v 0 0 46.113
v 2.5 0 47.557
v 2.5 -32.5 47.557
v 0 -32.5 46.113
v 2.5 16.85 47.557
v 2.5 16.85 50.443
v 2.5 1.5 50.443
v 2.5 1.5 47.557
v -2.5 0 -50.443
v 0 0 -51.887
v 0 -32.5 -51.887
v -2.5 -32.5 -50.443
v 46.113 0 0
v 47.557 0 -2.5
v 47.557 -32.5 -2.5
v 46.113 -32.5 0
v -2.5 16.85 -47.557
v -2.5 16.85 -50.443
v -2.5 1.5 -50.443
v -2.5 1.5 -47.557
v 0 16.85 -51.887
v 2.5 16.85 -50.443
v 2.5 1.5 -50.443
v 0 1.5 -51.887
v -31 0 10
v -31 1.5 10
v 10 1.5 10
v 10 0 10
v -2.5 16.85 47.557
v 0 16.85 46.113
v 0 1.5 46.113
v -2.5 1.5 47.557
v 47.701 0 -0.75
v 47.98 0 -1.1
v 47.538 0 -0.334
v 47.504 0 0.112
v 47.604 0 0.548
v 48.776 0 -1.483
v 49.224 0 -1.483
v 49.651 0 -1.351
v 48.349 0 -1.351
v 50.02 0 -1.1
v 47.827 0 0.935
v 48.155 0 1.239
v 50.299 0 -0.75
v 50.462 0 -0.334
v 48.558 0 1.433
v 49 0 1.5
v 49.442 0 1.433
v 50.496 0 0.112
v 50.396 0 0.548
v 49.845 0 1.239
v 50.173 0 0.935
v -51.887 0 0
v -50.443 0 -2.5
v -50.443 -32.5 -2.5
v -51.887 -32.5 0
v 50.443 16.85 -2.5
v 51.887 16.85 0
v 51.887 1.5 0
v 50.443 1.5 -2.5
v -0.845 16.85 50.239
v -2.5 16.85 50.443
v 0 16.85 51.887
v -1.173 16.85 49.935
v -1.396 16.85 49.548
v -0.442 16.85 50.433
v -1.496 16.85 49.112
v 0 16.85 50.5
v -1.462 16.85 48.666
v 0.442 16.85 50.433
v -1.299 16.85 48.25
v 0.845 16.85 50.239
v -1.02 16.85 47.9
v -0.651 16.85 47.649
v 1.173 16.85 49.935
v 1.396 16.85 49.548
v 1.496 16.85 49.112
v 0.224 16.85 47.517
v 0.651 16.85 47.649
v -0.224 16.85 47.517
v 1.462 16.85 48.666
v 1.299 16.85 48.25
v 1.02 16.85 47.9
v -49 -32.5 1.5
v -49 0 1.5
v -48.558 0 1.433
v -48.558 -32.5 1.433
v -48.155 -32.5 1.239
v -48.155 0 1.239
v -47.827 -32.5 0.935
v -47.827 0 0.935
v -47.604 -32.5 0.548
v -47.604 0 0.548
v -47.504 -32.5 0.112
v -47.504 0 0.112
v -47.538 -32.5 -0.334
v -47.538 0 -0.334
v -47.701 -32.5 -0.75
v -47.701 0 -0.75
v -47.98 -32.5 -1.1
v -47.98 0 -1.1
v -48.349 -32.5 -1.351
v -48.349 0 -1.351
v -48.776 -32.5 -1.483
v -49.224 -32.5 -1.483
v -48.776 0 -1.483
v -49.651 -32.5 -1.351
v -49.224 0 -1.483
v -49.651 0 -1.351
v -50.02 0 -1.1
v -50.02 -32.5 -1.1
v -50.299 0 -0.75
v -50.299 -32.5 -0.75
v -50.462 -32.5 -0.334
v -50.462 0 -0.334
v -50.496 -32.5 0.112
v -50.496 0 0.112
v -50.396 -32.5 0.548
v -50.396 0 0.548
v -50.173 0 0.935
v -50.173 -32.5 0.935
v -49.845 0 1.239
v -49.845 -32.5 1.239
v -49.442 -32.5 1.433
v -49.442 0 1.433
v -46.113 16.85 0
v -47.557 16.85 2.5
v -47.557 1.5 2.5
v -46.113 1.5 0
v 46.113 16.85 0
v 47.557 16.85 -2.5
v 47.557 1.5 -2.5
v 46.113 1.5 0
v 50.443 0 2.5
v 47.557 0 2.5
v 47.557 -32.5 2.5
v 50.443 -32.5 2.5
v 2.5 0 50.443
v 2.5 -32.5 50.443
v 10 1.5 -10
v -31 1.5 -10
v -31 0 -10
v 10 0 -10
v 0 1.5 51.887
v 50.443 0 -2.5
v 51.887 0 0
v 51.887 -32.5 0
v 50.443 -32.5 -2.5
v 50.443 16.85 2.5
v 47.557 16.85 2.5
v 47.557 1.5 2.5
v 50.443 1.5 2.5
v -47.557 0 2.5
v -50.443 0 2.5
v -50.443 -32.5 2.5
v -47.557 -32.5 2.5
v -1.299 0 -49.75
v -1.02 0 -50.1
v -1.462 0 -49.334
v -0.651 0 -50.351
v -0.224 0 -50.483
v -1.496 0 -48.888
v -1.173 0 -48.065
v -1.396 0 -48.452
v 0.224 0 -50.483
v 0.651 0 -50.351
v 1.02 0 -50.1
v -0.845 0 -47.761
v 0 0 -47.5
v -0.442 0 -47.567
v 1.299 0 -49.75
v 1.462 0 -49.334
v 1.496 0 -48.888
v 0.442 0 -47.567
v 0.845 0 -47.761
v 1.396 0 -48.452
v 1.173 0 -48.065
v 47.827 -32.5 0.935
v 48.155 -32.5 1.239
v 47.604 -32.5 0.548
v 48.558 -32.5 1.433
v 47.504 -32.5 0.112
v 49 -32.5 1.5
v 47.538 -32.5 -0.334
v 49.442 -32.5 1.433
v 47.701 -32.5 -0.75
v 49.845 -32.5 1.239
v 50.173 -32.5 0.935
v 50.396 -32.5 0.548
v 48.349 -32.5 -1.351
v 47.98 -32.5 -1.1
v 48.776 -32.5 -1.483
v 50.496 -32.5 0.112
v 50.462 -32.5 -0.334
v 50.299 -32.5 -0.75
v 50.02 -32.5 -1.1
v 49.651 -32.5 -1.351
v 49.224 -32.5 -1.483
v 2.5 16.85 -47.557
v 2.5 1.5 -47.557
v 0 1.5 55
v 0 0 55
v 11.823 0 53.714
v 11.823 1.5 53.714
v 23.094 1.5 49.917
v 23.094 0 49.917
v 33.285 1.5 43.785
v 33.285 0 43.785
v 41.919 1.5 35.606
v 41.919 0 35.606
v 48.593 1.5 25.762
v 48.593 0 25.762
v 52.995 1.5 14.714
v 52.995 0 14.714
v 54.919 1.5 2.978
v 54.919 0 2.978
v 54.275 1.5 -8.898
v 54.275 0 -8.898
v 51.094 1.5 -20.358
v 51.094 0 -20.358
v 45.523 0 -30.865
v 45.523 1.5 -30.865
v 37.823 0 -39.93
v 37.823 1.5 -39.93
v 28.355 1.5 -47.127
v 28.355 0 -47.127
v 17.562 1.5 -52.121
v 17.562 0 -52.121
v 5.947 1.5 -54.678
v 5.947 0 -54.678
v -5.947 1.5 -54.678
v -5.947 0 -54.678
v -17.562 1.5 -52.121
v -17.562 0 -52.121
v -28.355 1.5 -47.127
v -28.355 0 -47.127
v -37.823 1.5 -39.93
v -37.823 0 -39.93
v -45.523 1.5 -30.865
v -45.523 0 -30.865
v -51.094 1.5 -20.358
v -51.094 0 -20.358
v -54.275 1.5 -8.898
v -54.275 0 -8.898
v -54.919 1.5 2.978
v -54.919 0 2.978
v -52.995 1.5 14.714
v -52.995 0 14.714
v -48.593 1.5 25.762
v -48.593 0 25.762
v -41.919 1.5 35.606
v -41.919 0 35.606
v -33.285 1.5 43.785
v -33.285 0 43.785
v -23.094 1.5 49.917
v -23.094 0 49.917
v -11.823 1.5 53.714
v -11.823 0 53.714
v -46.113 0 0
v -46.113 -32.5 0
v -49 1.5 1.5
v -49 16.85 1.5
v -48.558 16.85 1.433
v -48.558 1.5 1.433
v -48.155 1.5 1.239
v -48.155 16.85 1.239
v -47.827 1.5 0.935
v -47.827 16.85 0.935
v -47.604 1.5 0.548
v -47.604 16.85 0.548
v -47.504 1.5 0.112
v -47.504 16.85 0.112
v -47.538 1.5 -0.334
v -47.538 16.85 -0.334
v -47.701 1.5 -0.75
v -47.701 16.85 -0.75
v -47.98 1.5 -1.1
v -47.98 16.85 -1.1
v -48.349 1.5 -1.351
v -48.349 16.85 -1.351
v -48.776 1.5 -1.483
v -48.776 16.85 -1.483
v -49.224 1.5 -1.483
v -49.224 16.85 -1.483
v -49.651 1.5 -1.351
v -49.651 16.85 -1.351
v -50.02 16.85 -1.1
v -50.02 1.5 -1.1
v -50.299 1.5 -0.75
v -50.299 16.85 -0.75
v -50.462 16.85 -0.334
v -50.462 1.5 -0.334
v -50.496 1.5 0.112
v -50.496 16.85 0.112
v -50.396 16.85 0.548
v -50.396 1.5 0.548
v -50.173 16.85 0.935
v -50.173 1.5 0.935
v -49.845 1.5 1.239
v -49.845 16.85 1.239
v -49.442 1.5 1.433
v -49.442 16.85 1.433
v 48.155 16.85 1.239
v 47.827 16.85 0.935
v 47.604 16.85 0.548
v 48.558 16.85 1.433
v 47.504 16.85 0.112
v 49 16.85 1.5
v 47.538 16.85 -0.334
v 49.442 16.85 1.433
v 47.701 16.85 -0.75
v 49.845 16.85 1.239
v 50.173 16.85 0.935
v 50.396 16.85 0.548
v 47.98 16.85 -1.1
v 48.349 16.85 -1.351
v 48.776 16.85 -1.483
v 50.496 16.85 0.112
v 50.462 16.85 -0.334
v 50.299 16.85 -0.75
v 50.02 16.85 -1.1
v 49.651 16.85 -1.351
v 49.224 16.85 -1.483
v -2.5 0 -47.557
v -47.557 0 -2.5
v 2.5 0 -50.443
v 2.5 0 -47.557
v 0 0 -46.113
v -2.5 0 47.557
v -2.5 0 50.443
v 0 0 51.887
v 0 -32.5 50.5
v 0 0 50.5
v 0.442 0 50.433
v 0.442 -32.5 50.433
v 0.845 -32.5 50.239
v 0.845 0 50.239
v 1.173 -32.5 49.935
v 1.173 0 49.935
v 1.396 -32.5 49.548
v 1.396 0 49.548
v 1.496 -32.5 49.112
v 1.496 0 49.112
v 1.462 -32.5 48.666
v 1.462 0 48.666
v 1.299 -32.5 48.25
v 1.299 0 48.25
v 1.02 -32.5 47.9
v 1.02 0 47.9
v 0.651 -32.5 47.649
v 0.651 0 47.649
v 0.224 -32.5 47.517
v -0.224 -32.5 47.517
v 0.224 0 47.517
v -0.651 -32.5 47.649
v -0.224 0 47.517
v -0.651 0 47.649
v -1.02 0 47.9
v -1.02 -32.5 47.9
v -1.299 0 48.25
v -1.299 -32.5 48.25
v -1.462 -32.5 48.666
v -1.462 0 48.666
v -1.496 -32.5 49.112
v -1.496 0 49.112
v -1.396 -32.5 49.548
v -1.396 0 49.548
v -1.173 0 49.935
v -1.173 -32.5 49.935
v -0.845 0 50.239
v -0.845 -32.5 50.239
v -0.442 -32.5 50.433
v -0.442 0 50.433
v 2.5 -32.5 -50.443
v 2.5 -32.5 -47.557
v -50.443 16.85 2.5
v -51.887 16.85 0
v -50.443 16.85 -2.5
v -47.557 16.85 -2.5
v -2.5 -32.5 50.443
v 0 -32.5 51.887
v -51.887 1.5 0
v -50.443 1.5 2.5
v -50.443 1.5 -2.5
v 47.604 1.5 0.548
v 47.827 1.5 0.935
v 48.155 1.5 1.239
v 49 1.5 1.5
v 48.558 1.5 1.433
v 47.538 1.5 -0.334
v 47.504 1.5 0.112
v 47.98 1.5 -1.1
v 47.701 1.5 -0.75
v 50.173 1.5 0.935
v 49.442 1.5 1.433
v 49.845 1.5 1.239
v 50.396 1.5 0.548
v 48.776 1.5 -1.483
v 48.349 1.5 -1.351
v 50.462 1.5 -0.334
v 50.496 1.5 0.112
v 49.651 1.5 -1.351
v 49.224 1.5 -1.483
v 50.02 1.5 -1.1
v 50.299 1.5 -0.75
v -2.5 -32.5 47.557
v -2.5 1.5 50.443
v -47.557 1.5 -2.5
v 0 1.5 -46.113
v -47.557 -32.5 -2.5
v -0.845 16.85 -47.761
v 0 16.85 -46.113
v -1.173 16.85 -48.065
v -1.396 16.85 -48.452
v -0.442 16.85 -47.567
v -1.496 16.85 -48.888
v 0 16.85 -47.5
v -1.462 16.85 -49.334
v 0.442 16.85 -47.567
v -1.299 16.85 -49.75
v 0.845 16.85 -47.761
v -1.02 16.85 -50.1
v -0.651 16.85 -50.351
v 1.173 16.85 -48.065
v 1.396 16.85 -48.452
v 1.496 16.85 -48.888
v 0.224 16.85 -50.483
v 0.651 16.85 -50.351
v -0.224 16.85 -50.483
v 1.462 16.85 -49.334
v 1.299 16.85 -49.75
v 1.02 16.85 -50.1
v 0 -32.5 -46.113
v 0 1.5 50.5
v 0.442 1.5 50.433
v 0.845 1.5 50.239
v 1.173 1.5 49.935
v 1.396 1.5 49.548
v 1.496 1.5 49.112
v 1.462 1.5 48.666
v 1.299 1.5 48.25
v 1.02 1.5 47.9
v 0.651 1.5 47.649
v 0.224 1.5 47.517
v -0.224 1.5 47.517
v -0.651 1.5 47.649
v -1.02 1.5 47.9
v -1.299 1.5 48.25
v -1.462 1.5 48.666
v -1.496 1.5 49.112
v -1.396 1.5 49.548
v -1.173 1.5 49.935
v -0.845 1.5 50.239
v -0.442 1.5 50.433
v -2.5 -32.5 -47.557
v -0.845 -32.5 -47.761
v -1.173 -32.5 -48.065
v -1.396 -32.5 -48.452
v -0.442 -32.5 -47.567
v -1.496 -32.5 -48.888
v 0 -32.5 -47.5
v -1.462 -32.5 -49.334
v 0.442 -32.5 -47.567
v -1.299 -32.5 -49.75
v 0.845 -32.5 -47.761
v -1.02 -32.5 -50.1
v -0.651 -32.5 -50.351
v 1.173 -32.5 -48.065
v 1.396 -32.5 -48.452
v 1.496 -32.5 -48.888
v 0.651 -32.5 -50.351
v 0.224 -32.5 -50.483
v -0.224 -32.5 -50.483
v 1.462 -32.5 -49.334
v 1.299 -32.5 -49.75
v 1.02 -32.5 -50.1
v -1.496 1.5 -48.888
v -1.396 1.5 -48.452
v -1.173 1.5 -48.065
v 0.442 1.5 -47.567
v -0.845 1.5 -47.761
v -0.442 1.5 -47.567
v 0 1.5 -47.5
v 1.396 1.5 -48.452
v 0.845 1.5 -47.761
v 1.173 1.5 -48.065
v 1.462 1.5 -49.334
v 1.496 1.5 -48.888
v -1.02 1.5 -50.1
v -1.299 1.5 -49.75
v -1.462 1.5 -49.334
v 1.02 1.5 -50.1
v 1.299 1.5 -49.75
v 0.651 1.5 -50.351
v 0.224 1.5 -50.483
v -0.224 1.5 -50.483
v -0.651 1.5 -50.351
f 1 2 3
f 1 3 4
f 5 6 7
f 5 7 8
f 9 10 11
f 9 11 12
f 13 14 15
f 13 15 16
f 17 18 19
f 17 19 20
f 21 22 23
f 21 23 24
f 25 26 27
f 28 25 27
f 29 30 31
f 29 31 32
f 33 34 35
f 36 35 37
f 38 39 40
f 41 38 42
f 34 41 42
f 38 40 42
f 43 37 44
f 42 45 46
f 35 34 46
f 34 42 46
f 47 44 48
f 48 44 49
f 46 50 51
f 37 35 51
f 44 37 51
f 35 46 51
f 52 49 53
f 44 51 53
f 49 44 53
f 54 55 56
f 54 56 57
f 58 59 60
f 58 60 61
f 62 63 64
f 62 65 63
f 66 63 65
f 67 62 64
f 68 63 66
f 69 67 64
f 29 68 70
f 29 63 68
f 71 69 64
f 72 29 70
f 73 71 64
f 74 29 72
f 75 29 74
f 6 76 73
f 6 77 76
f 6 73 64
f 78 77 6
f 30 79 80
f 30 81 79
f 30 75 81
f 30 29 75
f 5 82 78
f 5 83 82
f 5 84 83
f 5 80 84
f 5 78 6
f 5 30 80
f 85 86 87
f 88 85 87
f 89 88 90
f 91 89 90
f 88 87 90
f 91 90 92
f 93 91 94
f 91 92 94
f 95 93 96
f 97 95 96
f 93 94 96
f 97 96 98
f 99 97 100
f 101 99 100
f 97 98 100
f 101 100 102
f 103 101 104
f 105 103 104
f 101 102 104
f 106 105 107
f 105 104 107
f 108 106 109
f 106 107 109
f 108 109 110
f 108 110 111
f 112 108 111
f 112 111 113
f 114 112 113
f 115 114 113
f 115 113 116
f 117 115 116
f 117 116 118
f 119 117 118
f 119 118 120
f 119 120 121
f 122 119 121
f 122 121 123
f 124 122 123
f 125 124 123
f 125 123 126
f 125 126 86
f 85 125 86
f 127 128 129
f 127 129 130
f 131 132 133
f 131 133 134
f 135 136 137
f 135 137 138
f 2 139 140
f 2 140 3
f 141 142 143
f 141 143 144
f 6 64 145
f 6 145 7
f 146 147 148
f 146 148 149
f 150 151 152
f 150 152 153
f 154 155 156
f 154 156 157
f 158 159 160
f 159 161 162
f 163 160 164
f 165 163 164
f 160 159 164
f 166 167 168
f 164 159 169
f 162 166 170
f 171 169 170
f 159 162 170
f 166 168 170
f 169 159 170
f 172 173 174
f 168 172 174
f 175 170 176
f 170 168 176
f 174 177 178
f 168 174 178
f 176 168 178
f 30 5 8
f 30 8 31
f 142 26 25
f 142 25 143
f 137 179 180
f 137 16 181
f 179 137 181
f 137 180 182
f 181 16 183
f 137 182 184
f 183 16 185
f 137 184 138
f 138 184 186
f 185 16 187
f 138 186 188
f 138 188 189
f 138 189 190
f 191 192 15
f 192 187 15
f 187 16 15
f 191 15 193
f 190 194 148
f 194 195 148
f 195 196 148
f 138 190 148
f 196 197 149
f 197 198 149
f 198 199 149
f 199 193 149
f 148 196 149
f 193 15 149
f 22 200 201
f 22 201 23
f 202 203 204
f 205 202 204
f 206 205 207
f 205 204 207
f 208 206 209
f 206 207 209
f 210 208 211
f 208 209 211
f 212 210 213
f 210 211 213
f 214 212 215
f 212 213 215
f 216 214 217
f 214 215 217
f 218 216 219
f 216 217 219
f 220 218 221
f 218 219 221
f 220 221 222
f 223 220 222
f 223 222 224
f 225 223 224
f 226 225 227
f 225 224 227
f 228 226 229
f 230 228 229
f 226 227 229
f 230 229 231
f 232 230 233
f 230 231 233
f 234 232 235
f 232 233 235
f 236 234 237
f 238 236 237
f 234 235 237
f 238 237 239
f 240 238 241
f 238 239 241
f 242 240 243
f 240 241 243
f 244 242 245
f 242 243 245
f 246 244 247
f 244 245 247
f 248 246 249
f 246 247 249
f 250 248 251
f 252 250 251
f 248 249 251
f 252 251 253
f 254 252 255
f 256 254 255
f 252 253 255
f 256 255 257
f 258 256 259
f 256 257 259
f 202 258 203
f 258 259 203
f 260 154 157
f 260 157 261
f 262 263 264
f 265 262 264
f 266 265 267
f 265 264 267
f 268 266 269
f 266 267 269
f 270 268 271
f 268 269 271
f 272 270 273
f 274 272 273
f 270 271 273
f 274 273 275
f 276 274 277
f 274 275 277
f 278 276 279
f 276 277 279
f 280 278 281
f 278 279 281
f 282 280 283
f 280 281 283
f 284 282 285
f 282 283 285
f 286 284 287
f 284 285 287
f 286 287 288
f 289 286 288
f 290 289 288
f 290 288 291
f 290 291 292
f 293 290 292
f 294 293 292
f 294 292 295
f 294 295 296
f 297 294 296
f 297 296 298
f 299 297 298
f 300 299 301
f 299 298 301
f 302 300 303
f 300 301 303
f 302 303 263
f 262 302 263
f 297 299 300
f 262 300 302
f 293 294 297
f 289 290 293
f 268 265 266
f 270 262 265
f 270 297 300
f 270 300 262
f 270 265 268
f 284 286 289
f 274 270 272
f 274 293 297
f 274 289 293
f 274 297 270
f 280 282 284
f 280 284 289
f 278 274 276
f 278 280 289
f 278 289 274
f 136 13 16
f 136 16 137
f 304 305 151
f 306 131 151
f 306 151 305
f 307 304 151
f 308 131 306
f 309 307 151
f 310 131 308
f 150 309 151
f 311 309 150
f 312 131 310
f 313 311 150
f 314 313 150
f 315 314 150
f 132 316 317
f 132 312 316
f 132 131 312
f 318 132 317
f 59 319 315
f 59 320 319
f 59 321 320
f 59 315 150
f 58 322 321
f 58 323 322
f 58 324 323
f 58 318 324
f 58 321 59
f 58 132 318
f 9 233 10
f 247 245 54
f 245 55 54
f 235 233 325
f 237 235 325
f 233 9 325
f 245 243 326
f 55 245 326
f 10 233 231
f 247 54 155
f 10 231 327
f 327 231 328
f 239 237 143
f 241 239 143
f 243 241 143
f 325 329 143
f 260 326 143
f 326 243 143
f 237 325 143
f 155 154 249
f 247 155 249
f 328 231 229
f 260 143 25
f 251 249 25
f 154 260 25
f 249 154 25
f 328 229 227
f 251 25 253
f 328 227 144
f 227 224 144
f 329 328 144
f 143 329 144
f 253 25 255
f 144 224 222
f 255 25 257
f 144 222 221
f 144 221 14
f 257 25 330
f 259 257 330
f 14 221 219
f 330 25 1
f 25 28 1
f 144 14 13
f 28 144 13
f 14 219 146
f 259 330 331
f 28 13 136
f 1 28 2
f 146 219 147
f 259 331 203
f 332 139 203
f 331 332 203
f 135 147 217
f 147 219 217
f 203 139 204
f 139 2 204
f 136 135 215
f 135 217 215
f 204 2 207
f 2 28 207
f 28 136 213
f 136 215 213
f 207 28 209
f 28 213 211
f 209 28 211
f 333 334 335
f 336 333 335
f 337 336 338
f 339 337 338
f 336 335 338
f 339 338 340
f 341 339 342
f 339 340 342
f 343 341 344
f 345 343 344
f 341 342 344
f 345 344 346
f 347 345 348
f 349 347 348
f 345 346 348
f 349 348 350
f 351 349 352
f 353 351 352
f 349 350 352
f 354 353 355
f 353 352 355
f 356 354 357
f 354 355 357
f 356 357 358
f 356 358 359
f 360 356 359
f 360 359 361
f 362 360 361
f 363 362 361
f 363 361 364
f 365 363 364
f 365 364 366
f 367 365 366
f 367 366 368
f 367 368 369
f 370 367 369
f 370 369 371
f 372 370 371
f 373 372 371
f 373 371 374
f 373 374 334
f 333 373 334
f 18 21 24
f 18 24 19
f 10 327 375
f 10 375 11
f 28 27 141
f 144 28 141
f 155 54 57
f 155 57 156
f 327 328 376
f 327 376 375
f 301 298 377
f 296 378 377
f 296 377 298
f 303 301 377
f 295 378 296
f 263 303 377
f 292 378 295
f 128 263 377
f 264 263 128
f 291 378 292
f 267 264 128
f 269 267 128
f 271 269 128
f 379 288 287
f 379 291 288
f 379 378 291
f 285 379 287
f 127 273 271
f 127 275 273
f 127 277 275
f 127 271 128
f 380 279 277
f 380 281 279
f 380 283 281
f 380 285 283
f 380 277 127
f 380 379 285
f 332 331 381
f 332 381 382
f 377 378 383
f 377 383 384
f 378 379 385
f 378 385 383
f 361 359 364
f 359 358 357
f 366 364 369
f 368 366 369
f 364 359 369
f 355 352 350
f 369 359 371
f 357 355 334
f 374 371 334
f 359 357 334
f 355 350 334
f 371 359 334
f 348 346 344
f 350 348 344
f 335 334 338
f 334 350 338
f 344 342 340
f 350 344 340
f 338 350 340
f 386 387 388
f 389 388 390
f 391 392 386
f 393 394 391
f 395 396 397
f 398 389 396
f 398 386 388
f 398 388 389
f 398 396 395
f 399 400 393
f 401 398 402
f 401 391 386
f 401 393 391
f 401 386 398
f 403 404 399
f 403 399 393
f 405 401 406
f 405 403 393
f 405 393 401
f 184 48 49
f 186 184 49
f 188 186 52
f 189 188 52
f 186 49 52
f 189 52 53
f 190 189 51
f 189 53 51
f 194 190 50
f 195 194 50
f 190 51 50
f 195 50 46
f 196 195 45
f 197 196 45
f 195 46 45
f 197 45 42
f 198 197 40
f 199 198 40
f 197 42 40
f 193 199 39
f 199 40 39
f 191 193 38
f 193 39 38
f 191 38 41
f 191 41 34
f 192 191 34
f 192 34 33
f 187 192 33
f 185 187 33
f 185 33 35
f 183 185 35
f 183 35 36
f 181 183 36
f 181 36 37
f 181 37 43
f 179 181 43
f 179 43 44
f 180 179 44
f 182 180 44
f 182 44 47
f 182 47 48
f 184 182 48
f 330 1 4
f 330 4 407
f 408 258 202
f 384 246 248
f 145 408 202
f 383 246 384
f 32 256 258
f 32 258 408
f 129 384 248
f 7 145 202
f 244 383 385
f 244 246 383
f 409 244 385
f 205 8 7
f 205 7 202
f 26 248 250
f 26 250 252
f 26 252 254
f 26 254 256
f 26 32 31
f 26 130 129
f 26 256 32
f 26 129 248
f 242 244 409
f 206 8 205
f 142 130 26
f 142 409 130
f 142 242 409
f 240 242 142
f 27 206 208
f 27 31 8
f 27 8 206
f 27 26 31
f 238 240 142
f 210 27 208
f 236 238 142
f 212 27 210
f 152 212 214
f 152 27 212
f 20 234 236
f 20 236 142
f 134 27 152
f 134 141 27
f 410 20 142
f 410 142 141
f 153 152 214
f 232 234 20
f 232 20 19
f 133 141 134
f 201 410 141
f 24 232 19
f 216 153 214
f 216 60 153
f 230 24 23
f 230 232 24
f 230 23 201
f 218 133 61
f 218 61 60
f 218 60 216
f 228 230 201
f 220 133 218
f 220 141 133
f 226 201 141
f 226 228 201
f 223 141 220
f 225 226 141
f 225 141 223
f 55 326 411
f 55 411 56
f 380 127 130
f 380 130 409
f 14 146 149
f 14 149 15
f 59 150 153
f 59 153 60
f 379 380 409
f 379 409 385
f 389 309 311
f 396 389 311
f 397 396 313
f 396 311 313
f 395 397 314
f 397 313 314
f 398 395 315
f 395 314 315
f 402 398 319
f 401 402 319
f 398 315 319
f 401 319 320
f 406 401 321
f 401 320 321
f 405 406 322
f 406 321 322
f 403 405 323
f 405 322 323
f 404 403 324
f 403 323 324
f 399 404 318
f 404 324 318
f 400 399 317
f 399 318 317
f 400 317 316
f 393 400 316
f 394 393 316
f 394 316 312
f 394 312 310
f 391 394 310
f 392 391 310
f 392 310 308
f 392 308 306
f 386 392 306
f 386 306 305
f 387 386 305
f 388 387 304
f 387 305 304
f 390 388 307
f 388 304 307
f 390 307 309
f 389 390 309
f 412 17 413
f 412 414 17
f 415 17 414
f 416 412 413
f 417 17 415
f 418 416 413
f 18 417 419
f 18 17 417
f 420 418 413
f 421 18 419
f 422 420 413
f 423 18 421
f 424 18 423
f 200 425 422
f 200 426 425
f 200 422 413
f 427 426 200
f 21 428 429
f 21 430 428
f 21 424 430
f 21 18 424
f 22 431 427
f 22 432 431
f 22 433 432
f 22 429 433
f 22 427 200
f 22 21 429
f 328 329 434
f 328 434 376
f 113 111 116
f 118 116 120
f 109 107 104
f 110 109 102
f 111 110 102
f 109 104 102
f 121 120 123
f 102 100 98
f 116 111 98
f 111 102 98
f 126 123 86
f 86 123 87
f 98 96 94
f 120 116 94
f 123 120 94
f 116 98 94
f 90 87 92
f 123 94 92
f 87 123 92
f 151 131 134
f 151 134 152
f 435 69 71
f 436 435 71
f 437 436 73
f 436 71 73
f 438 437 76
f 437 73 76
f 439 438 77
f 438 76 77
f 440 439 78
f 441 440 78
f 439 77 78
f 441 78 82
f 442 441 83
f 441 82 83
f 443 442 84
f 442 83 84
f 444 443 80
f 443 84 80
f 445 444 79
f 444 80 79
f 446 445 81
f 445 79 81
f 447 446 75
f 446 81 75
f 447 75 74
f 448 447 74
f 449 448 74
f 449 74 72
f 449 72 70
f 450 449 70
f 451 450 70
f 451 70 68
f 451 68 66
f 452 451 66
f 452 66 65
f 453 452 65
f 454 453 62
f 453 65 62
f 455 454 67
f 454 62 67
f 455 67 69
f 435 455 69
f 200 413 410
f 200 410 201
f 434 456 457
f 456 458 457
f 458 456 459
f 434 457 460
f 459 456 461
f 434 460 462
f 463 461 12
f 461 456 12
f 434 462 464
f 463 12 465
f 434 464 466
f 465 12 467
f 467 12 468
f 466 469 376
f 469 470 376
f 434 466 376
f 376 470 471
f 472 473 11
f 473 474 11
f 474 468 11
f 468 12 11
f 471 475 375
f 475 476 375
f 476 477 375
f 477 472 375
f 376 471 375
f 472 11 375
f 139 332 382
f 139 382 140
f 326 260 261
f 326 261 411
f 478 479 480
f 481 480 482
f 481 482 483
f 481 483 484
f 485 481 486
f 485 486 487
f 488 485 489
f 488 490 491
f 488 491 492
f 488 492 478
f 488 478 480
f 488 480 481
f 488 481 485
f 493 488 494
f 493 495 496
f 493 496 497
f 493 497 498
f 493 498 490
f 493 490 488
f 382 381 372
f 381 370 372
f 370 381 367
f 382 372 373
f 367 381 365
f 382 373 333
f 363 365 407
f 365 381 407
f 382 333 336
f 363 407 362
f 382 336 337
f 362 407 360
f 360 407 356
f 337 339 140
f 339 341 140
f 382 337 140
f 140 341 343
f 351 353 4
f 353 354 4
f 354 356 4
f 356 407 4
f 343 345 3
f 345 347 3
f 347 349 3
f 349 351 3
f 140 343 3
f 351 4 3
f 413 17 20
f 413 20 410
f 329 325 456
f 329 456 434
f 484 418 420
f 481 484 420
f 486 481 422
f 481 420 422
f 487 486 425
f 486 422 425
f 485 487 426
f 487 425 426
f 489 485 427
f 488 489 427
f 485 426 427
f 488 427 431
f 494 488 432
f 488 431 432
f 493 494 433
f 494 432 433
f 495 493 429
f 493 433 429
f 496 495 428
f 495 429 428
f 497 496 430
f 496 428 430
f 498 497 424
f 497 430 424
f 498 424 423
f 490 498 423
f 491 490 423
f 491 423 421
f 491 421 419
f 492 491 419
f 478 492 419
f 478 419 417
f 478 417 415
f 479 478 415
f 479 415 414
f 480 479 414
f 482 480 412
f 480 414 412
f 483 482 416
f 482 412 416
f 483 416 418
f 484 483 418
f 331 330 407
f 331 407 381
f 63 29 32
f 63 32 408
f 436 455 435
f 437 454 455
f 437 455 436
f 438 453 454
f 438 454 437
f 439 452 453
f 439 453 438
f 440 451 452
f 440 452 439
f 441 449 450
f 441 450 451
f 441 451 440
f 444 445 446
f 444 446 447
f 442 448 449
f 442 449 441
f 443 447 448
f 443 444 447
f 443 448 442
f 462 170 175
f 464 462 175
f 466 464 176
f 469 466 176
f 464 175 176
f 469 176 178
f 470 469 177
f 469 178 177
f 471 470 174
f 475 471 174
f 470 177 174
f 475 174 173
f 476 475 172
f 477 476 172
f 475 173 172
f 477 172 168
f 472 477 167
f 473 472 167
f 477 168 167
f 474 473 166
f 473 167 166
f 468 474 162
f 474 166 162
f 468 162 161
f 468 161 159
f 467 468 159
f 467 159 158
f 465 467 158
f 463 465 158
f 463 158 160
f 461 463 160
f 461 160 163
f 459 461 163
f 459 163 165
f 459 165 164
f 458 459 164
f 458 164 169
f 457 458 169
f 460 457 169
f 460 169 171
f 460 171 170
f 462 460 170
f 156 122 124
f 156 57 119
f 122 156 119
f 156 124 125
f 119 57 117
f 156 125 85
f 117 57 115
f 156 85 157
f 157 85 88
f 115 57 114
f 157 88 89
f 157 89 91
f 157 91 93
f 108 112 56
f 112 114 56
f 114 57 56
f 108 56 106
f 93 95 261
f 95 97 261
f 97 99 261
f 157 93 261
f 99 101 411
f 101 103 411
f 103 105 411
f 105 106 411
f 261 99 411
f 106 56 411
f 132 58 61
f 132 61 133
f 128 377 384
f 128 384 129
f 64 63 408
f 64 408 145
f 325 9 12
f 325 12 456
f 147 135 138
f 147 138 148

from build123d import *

# Parameters (mm, degrees)
SKETCH_1_R          = 55
EXTRUDE_1_DEPTH     = 1.5
SKETCH_2_W          = 41
SKETCH_2_H          = 20
CUT_EXTRUDE_1_DEPTH = 1.5
SKETCH_3_R          = 1.5
EXTRUDE_3_DEPTH     = 34
EXTRUDE_START       = 15.35
SKETCH_3_3_R        = 1.5
EXTRUDE_4_DEPTH     = 15.35


with BuildPart() as part:
    # 草图1 → 凸台-拉伸1 (new body)
    with BuildSketch(Plane(origin=(0, 0, 0), x_dir=(1, 0, 0), z_dir=(0, 1, 0))):
        Circle(SKETCH_1_R)
    extrude(amount=EXTRUDE_1_DEPTH)

    # 草图2 → 切除-拉伸1 (cut)
    with BuildSketch(Plane(origin=(0, 1.5, 0), x_dir=(1, 0, 0), z_dir=(0, 1, 0))):
        with Locations((-10.5, 0)):
            Rectangle(SKETCH_2_W, SKETCH_2_H)
    extrude(amount=-CUT_EXTRUDE_1_DEPTH, mode=Mode.SUBTRACT)

    # 草图3 → 凸台-拉伸3 (add)
    # profile 1 of 4: a face of its own
    with BuildSketch(Plane(origin=(0, 1.5, 0), x_dir=(1, 0, 0), z_dir=(0, 1, 0))):
        Polygon((-2.5, 47.556624327), (0, 46.113248654), (2.5, 47.556624327), (2.5, 50.443375673), (0, 51.886751346), (-2.5, 50.443375673), align=None)
        with Locations((0, 49)):
            Circle(SKETCH_3_R, mode=Mode.SUBTRACT)
    # profile 2 of 4: a face of its own
    with BuildSketch(Plane(origin=(0, 1.5, 0), x_dir=(1, 0, 0), z_dir=(0, 1, 0))):
        Polygon((-46.113248654, 0), (-47.556624327, 2.5), (-50.443375673, 2.5), (-51.886751346, 0), (-50.443375673, -2.5), (-47.556624327, -2.5), align=None)
        with Locations((-49, 0)):
            Circle(SKETCH_3_R, mode=Mode.SUBTRACT)
    # profile 3 of 4: a face of its own
    with BuildSketch(Plane(origin=(0, 1.5, 0), x_dir=(1, 0, 0), z_dir=(0, 1, 0))):
        Polygon((47.556624327, 2.5), (46.113248654, 0), (47.556624327, -2.5), (50.443375673, -2.5), (51.886751346, 0), (50.443375673, 2.5), align=None)
        with Locations((49, 0)):
            Circle(SKETCH_3_R, mode=Mode.SUBTRACT)
    # profile 4 of 4: a face of its own
    with BuildSketch(Plane(origin=(0, 1.5, 0), x_dir=(1, 0, 0), z_dir=(0, 1, 0))):
        Polygon((2.5, -47.556624327), (0, -46.113248654), (-2.5, -47.556624327), (-2.5, -50.443375673), (0, -51.886751346), (2.5, -50.443375673), align=None)
        with Locations((0, -49)):
            Circle(SKETCH_3_R, mode=Mode.SUBTRACT)
    extrude(amount=-EXTRUDE_3_DEPTH)

    # 草图3<3> → 凸台-拉伸4 (add)
    # profile 1 of 4: a face of its own
    with BuildSketch(Plane(origin=(0, 1.5, 0), x_dir=(1, 0, 0), z_dir=(0, 1, 0)).offset(EXTRUDE_START)):
        Polygon((-2.5, 47.556624327), (0, 46.113248654), (2.5, 47.556624327), (2.5, 50.443375673), (0, 51.886751346), (-2.5, 50.443375673), align=None)
        with Locations((0, 49)):
            Circle(SKETCH_3_3_R, mode=Mode.SUBTRACT)
    # profile 2 of 4: a face of its own
    with BuildSketch(Plane(origin=(0, 1.5, 0), x_dir=(1, 0, 0), z_dir=(0, 1, 0)).offset(EXTRUDE_START)):
        Polygon((-46.113248654, 0), (-47.556624327, 2.5), (-50.443375673, 2.5), (-51.886751346, 0), (-50.443375673, -2.5), (-47.556624327, -2.5), align=None)
        with Locations((-49, 0)):
            Circle(SKETCH_3_3_R, mode=Mode.SUBTRACT)
    # profile 3 of 4: a face of its own
    with BuildSketch(Plane(origin=(0, 1.5, 0), x_dir=(1, 0, 0), z_dir=(0, 1, 0)).offset(EXTRUDE_START)):
        Polygon((47.556624327, 2.5), (46.113248654, 0), (47.556624327, -2.5), (50.443375673, -2.5), (51.886751346, 0), (50.443375673, 2.5), align=None)
        with Locations((49, 0)):
            Circle(SKETCH_3_3_R, mode=Mode.SUBTRACT)
    # profile 4 of 4: a face of its own
    with BuildSketch(Plane(origin=(0, 1.5, 0), x_dir=(1, 0, 0), z_dir=(0, 1, 0)).offset(EXTRUDE_START)):
        Polygon((2.5, -47.556624327), (0, -46.113248654), (-2.5, -47.556624327), (-2.5, -50.443375673), (0, -51.886751346), (2.5, -50.443375673), align=None)
        with Locations((0, -49)):
            Circle(SKETCH_3_3_R, mode=Mode.SUBTRACT)
    extrude(amount=-EXTRUDE_4_DEPTH)


solid = part.part
